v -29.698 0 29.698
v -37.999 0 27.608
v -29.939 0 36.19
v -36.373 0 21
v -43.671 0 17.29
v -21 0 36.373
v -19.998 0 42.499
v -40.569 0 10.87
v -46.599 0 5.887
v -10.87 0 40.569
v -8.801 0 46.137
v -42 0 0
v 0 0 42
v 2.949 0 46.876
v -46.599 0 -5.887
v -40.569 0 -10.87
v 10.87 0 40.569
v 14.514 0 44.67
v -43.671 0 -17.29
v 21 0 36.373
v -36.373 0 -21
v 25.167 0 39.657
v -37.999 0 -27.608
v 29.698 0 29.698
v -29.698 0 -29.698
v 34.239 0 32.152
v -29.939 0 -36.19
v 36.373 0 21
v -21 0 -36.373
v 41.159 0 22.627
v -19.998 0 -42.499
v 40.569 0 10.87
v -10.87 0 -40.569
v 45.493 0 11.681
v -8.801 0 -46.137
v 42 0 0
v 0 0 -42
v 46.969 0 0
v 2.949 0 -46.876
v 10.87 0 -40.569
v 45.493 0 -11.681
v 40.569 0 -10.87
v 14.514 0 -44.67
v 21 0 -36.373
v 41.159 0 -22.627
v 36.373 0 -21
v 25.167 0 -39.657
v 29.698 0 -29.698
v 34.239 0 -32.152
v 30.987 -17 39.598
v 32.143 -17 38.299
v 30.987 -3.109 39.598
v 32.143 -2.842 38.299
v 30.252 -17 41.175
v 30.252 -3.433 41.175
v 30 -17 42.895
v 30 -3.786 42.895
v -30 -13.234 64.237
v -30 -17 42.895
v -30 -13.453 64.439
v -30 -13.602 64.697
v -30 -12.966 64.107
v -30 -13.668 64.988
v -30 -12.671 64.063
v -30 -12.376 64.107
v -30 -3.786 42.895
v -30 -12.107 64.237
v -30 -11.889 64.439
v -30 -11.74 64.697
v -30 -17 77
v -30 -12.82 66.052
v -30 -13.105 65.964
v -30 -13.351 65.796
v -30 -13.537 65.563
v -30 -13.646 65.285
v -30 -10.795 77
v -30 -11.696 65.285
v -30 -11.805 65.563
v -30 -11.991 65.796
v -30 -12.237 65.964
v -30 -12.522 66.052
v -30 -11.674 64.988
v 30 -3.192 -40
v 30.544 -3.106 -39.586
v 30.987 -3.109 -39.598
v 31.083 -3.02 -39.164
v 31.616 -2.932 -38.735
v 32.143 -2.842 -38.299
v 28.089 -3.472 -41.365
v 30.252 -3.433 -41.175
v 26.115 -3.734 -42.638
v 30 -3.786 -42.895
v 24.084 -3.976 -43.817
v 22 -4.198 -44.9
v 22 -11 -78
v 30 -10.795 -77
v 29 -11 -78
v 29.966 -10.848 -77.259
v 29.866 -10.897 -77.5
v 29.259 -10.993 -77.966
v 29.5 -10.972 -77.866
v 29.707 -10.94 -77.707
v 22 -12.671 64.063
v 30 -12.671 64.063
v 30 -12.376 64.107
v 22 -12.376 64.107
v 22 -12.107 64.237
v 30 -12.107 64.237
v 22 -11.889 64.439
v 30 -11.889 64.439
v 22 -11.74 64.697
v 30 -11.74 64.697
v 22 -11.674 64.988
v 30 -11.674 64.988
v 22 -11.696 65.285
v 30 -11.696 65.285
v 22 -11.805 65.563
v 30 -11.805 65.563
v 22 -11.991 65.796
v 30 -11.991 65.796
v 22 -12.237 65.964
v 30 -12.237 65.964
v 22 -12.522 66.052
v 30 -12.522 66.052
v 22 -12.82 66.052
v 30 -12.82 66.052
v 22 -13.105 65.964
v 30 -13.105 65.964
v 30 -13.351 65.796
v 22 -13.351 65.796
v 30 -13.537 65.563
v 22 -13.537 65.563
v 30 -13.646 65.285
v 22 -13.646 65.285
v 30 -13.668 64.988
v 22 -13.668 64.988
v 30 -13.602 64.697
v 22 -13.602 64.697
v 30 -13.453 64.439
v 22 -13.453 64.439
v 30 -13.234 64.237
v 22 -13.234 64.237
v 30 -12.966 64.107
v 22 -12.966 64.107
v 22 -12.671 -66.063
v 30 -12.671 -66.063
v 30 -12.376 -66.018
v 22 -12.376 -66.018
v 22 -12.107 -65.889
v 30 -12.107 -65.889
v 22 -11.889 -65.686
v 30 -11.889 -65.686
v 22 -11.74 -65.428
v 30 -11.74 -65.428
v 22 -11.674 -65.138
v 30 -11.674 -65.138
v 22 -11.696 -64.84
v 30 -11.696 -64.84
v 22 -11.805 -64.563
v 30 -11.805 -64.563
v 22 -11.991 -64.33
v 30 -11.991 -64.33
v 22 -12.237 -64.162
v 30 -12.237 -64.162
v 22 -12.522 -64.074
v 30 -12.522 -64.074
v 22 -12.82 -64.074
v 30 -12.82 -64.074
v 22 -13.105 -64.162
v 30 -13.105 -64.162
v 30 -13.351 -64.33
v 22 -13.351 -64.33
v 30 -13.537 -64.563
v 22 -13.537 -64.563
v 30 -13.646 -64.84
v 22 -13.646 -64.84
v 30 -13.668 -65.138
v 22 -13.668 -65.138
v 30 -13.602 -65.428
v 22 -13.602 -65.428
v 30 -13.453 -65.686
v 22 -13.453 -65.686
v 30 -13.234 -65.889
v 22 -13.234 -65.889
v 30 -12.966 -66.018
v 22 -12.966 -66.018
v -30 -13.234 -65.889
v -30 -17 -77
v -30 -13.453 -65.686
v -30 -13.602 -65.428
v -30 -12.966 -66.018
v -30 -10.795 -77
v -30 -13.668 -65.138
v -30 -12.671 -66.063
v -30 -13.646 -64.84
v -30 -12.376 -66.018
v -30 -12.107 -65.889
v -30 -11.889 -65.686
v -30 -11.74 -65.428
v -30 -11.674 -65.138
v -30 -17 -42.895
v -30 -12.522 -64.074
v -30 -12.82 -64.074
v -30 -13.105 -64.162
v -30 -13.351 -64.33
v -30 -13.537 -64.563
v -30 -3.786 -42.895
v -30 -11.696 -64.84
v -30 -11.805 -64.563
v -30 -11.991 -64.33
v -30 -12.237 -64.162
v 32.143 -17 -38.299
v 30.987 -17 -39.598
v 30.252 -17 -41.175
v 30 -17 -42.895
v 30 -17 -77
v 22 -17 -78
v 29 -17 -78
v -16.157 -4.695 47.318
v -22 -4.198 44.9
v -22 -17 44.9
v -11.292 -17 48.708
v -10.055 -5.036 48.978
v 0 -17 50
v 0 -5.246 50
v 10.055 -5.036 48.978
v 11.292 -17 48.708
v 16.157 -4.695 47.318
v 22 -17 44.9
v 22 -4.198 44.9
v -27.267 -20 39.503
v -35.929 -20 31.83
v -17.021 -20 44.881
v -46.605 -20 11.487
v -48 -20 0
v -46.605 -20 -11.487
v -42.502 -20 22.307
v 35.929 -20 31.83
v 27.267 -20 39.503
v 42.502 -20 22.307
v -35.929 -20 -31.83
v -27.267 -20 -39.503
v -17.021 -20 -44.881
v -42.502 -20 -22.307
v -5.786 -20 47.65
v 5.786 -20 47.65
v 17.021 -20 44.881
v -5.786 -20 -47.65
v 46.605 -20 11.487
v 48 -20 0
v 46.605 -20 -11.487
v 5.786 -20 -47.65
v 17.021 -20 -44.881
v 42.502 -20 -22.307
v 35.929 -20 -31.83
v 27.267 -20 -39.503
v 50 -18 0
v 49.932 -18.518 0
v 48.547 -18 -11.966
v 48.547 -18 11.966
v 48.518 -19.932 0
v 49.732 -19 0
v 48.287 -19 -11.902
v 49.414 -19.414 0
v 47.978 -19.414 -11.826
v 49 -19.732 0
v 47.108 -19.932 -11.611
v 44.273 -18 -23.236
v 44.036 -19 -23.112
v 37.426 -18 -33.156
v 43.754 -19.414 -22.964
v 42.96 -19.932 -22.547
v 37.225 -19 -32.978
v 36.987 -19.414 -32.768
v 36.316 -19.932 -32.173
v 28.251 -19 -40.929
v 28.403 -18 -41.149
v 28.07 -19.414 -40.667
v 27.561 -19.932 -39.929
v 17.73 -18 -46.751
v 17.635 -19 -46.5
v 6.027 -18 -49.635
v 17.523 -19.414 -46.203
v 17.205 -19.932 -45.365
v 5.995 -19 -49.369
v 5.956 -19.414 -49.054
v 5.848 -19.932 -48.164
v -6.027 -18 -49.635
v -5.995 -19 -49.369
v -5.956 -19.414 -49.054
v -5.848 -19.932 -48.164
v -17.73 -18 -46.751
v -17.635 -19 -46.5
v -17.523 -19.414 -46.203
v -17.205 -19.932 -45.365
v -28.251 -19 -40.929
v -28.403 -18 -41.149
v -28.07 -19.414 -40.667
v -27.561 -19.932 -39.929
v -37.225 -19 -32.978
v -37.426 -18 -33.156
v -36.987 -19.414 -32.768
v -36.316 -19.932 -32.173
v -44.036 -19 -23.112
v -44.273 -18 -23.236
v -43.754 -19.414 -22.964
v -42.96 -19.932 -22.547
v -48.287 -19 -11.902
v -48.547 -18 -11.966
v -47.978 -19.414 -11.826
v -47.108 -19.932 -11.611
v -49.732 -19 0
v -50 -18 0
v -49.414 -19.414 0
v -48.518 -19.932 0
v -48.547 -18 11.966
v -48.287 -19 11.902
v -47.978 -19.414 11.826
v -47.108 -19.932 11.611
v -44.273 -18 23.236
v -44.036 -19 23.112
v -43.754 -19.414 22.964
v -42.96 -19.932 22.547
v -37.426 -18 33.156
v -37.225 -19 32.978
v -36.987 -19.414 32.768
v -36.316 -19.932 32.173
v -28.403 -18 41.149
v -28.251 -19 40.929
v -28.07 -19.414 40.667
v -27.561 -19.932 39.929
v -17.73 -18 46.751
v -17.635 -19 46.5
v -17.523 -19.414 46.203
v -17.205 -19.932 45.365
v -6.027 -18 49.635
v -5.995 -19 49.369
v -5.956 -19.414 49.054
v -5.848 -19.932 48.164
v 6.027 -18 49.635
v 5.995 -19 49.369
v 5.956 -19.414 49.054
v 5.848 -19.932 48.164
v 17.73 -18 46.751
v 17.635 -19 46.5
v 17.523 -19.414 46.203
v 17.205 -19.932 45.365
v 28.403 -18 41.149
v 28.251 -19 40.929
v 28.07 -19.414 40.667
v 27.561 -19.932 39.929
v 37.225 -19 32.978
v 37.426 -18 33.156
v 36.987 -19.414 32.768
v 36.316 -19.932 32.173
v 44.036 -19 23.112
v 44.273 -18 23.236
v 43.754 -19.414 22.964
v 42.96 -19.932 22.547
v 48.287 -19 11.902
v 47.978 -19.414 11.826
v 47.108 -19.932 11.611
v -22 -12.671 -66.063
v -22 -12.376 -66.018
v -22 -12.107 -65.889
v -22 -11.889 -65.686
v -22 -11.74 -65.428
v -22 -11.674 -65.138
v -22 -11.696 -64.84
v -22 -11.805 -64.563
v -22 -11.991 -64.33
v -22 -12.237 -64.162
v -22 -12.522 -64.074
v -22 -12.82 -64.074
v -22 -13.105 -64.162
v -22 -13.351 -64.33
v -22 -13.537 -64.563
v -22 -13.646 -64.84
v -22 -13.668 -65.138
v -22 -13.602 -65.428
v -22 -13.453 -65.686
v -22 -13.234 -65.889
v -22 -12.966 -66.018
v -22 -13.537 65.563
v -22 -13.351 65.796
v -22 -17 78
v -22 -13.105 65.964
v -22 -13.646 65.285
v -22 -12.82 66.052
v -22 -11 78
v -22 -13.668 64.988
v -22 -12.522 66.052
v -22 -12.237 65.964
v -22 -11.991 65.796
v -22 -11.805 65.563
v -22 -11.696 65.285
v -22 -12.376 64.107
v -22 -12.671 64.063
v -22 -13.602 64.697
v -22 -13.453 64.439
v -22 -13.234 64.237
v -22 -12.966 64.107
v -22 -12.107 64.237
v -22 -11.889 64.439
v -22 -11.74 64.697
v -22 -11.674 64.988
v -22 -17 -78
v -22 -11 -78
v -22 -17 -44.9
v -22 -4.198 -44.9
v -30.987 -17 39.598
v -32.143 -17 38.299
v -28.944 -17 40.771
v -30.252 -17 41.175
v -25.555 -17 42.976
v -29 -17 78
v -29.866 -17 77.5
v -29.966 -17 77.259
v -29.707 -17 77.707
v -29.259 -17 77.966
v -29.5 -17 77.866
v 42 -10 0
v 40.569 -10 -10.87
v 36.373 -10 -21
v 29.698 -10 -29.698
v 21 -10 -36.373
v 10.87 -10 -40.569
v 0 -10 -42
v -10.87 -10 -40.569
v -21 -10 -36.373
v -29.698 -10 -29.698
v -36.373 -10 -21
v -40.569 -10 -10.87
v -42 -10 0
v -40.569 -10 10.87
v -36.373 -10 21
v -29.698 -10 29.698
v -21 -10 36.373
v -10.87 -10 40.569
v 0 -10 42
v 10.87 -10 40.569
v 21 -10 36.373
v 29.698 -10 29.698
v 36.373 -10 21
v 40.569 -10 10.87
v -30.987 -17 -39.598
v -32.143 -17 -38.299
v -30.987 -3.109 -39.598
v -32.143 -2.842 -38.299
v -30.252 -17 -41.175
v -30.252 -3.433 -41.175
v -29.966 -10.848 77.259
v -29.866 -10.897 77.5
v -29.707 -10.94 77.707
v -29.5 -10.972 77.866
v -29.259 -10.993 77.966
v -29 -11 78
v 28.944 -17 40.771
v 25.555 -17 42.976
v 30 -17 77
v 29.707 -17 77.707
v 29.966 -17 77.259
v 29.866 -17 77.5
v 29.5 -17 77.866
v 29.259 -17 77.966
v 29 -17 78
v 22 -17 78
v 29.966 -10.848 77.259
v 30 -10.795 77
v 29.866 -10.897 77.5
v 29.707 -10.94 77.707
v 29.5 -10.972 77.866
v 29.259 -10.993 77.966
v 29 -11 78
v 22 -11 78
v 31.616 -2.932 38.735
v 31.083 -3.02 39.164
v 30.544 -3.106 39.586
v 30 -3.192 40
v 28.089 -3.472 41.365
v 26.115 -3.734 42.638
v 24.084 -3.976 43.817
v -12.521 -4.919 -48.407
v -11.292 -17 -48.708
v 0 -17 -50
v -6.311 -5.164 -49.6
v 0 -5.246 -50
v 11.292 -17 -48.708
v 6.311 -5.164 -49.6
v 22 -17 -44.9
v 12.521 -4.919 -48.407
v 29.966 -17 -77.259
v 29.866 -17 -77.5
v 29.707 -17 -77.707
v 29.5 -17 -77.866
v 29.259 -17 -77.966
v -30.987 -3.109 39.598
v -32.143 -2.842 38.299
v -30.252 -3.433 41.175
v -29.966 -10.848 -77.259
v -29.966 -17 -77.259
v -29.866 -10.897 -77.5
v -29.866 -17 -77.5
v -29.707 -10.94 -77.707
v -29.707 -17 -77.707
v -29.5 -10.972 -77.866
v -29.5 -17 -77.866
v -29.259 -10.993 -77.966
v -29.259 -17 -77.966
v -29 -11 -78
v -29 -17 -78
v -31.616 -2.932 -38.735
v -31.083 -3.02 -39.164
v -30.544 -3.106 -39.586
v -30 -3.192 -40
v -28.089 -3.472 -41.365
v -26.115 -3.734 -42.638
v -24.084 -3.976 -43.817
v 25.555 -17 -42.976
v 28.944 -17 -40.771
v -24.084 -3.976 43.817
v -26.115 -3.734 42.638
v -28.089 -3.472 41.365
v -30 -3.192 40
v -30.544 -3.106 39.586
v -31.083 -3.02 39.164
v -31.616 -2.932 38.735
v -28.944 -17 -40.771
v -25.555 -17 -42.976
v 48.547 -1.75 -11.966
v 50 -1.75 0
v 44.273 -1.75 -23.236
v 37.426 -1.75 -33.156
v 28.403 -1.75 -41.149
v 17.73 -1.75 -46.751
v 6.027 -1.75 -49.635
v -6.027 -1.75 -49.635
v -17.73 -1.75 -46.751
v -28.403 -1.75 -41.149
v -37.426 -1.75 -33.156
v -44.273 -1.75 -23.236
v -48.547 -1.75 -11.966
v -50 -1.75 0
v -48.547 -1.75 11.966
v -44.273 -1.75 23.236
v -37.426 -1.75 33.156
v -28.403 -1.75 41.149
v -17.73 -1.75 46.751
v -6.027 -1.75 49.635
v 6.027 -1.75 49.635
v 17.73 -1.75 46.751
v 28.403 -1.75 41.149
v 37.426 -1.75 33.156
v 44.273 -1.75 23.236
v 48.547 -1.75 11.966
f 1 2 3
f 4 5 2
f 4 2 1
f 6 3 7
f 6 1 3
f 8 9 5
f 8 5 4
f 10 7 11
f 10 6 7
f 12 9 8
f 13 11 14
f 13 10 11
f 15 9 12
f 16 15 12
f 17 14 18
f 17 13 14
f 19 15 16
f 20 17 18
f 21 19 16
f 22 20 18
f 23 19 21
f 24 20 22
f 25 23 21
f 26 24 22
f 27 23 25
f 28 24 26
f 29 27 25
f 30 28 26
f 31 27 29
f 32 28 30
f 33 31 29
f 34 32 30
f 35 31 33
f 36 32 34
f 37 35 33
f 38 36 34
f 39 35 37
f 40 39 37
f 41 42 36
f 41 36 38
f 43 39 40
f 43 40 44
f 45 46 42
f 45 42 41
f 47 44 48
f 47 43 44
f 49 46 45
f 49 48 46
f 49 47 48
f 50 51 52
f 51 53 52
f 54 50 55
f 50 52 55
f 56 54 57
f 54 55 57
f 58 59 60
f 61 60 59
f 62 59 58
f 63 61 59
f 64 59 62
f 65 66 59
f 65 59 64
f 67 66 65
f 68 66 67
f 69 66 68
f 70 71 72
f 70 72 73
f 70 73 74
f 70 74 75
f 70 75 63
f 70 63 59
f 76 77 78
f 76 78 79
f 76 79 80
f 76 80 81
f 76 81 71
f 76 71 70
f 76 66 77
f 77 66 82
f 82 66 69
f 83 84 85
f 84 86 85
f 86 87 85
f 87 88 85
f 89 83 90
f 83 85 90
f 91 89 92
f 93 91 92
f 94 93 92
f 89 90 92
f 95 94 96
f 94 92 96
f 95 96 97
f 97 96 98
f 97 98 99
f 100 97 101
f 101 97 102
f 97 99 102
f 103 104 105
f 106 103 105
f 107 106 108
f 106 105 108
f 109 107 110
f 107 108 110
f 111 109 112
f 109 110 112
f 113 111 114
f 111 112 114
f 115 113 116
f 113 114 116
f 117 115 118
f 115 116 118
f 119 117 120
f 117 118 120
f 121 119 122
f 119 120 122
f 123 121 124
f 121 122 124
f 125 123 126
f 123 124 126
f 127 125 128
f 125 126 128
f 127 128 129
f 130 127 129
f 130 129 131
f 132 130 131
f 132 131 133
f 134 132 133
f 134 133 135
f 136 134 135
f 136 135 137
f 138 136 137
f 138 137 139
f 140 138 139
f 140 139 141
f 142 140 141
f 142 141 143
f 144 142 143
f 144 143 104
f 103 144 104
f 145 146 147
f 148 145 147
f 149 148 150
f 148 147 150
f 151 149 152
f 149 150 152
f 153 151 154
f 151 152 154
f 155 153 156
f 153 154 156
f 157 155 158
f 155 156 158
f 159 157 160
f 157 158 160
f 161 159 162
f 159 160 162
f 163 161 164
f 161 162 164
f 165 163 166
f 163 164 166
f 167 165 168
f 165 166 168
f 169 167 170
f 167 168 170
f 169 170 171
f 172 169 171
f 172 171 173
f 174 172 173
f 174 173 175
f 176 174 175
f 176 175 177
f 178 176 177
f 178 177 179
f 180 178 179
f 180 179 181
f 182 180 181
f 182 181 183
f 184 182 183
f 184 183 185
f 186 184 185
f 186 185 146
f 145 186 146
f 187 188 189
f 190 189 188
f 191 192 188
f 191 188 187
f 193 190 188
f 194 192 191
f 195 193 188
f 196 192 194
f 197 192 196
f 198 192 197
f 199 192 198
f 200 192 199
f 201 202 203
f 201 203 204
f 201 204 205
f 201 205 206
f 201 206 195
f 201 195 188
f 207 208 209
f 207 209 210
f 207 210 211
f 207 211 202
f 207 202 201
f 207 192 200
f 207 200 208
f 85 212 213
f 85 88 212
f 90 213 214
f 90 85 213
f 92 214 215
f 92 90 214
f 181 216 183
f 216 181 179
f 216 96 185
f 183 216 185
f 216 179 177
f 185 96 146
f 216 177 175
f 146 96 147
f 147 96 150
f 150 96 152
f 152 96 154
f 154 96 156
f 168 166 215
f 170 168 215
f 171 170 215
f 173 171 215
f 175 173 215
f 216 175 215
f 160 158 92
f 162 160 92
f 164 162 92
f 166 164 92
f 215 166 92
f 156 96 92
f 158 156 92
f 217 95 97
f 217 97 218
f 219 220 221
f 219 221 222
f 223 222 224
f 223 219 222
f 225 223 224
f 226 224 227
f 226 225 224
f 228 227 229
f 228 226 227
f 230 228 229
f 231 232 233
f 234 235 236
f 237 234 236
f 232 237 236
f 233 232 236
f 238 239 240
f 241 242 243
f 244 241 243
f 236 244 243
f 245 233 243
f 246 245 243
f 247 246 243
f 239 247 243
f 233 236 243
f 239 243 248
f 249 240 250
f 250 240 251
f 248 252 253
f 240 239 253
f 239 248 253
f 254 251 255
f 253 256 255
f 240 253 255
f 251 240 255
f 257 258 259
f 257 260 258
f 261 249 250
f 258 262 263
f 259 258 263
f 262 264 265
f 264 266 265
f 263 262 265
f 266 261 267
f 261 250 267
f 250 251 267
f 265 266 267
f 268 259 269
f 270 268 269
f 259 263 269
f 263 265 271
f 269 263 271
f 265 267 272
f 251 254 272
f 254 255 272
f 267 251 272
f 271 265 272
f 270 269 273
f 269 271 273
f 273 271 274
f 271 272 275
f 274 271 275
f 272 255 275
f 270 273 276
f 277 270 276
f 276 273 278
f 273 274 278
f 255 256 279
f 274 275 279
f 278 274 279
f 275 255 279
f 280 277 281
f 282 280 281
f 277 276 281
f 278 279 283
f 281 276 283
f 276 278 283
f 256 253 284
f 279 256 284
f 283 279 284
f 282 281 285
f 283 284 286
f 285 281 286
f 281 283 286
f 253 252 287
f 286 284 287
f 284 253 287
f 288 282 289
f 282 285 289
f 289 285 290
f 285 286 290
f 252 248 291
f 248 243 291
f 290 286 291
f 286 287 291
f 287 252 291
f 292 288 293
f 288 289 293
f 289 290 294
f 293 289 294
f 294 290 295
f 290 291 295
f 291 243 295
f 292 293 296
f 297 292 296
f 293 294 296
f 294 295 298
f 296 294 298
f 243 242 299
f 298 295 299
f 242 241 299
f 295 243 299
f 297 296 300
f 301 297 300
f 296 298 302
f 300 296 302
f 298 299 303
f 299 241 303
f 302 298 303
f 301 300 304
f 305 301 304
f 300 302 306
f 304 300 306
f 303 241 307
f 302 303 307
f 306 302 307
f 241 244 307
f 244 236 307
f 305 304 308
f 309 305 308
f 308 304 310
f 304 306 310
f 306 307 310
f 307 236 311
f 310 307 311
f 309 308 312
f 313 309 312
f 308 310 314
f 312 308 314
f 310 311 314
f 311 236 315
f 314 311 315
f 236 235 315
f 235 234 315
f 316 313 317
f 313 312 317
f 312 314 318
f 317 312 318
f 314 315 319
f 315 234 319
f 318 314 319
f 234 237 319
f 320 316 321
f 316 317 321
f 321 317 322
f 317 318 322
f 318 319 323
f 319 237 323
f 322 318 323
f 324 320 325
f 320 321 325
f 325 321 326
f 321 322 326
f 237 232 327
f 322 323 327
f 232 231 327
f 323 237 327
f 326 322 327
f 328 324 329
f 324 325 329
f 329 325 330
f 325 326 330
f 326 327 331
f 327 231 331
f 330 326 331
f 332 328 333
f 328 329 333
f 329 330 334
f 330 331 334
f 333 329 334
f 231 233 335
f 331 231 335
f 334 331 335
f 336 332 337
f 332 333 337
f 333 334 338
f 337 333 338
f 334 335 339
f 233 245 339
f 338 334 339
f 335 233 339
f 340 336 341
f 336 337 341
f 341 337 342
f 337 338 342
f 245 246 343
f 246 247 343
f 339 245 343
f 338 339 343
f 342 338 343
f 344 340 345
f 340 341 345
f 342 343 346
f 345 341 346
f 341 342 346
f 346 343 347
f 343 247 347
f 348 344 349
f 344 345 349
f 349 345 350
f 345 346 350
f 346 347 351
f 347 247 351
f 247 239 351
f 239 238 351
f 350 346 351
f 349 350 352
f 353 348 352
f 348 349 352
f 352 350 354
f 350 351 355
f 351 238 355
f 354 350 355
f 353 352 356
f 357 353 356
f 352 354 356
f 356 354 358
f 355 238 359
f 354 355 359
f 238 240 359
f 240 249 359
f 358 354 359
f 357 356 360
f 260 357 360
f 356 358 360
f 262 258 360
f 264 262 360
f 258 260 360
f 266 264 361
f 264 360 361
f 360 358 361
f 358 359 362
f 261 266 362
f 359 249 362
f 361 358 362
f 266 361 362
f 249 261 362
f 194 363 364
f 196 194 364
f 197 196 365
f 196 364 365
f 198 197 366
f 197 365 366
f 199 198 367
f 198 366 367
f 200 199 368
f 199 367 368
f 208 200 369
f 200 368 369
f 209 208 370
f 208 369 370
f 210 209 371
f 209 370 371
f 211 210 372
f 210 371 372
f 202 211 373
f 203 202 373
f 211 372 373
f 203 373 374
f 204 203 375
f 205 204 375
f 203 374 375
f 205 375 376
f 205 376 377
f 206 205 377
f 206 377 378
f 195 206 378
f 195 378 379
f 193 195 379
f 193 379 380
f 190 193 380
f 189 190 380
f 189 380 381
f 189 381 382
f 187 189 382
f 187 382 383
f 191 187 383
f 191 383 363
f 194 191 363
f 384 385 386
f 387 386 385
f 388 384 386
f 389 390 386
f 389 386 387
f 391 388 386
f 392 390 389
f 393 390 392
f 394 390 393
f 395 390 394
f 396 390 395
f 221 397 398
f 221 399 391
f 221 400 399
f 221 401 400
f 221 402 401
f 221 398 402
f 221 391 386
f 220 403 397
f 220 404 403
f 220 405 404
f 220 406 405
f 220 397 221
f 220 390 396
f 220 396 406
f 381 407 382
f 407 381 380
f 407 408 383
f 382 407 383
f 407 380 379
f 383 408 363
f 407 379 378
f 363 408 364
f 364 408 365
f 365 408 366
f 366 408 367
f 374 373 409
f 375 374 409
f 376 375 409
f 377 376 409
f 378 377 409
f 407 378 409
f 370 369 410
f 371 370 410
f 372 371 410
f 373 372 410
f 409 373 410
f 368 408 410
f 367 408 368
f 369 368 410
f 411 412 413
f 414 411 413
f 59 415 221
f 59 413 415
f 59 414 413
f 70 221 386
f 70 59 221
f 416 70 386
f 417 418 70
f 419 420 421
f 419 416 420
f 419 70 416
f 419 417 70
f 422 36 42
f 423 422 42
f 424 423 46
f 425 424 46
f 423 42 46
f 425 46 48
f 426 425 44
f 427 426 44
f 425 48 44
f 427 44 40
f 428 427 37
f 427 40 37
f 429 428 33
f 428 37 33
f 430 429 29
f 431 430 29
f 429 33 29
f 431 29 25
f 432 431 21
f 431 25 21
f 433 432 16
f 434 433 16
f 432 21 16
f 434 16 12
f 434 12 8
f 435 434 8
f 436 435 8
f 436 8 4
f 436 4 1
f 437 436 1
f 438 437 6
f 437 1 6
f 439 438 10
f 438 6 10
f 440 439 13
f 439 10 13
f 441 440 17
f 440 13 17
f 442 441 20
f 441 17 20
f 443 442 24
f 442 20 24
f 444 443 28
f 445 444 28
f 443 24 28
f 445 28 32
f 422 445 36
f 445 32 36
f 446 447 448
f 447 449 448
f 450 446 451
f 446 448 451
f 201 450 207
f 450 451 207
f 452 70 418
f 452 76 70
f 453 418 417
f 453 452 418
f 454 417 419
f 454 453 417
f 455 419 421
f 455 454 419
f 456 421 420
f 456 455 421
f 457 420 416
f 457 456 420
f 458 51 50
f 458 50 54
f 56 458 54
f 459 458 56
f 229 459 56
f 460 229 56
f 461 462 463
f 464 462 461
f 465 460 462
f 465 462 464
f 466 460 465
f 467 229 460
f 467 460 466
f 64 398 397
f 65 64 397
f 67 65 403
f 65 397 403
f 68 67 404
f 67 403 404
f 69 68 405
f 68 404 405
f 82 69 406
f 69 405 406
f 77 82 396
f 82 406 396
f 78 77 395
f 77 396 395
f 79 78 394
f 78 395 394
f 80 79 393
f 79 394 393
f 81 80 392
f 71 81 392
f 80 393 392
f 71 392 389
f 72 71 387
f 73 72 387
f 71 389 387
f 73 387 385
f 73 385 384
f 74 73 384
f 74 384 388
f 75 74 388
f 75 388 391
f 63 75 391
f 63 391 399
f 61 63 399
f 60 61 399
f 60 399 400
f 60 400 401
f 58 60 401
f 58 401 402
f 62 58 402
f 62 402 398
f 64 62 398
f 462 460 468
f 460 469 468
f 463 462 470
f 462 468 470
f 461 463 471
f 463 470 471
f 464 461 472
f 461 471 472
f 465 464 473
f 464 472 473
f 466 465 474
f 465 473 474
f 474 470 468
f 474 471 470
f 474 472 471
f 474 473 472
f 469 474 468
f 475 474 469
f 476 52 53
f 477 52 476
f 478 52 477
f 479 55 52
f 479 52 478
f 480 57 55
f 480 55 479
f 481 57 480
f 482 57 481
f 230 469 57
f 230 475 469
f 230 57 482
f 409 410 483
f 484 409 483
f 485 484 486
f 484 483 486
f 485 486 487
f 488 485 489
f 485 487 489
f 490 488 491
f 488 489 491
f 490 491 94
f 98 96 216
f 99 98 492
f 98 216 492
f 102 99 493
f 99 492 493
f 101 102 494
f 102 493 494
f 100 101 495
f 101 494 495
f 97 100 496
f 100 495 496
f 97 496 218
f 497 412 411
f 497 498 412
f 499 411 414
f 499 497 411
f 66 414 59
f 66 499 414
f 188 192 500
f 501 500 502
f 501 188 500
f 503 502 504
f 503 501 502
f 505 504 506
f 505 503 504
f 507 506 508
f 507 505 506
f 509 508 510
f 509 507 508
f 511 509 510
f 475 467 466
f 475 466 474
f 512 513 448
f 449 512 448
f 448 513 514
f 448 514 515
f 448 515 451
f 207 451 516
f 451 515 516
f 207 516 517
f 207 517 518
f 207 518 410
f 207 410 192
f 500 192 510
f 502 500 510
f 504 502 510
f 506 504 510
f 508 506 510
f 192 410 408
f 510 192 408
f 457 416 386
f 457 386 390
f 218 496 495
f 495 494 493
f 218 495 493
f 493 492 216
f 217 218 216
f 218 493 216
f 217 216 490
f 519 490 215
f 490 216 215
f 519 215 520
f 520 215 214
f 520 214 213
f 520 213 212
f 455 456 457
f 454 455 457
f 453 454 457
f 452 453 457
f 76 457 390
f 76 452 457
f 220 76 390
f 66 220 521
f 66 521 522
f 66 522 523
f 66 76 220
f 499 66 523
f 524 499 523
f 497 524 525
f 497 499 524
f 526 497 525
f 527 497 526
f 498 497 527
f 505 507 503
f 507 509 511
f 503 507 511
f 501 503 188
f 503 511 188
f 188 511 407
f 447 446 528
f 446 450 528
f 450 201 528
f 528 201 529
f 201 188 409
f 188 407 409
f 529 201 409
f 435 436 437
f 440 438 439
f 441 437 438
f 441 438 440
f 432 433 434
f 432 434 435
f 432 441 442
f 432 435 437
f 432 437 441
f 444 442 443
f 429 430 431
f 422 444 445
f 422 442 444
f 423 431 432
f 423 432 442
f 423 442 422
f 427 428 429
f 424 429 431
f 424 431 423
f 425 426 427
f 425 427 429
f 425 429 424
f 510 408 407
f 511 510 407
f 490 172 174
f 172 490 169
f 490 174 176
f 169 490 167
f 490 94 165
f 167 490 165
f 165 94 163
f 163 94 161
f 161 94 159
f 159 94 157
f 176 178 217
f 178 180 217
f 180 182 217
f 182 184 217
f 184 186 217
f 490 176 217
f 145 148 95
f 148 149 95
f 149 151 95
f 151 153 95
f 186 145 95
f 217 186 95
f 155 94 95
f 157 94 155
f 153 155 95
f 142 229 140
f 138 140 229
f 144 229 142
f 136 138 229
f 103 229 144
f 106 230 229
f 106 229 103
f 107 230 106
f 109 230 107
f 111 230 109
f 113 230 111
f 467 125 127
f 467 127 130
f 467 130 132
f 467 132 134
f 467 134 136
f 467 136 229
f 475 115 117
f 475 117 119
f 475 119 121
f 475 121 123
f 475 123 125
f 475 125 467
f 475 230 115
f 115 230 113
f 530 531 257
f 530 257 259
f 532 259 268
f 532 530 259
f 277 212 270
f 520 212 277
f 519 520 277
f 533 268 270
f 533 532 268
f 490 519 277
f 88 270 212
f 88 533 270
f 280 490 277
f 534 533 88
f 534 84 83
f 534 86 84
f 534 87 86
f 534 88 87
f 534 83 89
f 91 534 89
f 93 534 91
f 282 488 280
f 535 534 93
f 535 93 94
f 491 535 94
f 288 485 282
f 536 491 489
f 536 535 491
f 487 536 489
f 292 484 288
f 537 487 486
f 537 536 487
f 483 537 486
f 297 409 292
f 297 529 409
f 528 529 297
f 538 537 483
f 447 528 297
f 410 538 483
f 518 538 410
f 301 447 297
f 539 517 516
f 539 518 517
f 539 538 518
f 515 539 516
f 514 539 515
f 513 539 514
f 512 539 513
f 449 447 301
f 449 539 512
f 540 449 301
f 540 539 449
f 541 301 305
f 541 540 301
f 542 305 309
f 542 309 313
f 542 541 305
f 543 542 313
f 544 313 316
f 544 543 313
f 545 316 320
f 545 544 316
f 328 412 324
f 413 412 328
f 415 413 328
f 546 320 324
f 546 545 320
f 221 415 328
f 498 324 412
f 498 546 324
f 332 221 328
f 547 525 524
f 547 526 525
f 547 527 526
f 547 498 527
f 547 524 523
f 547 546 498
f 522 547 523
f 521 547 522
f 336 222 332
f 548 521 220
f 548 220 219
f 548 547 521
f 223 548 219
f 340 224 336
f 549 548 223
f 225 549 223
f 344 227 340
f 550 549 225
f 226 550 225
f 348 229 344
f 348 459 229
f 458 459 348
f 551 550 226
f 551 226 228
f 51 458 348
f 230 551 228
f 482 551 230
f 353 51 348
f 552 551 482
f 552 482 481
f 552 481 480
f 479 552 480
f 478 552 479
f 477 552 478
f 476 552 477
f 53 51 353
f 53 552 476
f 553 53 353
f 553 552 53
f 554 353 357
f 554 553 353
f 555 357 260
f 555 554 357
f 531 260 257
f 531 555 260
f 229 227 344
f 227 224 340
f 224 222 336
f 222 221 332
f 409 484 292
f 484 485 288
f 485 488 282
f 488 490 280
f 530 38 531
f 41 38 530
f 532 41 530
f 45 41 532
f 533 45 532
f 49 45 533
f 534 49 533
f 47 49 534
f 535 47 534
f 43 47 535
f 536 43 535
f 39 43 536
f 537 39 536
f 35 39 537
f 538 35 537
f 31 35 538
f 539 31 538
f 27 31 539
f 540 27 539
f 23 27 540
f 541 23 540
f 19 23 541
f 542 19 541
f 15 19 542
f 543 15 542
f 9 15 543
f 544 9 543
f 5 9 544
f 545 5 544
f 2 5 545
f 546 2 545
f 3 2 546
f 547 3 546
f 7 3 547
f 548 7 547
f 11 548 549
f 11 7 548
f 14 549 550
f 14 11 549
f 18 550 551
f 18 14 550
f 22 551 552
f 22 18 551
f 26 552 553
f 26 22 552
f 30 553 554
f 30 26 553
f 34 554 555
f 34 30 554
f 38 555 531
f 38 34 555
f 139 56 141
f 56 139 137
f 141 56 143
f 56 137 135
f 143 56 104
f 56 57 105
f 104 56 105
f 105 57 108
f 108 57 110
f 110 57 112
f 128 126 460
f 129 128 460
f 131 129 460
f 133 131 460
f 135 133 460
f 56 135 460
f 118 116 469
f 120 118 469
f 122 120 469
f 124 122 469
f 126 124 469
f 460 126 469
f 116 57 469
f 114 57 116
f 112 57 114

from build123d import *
from build123d.topology import SkipClean

# Parameters (mm, degrees)
SKETCH1_R                = 50
BOSS_EXTRUDE1_DEPTH      = 20
BOSS_EXTRUDE2_DEPTH      = 30
BOSS_EXTRUDE2_DEPTH_BACK = 30
CUT_EXTRUDE2_DEPTH       = 30
CHAMFER1_SIZE            = 1.75
CHAMFER1_SIZE2           = 3.031089
SKETCH5_R                = 42
CUT_EXTRUDE3_DEPTH       = 10
FILLET1_R                = 6
FILLET2_R                = 6
FILLET3_R                = 2
FILLET4_R                = 1
CUT_EXTRUDE5_DEPTH       = 20
CUT_EXTRUDE5_DEPTH_BACK  = 85
SKETCH7_R                = 1
CUT_EXTRUDE6_DEPTH       = 25
CUT_EXTRUDE6_DEPTH_BACK  = 93
SKETCH8_R                = 1


with BuildPart() as part:
    # Sketch1 → Boss-Extrude1 (new body)
    with BuildSketch(Plane(origin=(0, 0, 0), x_dir=(1, 0, 0), z_dir=(0, 1, 0))):
        Circle(SKETCH1_R)
    extrude(amount=-BOSS_EXTRUDE1_DEPTH)

    # Sketch3 → Boss-Extrude2 (add, two sides: drawn at the far end of the back side and taken through both)
    with BuildSketch(Plane(origin=(0, 0, 0), x_dir=(0, 0, -1), z_dir=(1, 0, 0)).offset(-BOSS_EXTRUDE2_DEPTH_BACK)):
        Polygon((34.980741, -17), (34.980741, -2.160126), (78, -11), (78, -17), align=None)
        Polygon((-78, -11), (-34.980741, -2.160126), (-34.980741, -17), (-78, -17), align=None)
    extrude(amount=BOSS_EXTRUDE2_DEPTH + BOSS_EXTRUDE2_DEPTH_BACK)

    # Sketch4 → Cut-Extrude2 (cut)
    with SkipClean():  # the faces are left unmerged after this step: merging them gives an invalid solid
        with BuildSketch(Plane(origin=(0, 0, 0), x_dir=(1, 0, 0), z_dir=(0, 1, 0))):
            with BuildLine():
                Line((22, 78), (-22, 78))
                Line((-22, 78), (-22, 44.899889))
                ThreePointArc((-22, 44.899889), (0, 50), (22, 44.899889))
                Line((22, 44.899889), (22, 78))
            make_face()
            with BuildLine():
                Line((-22, -78), (-22, -44.899889))
                ThreePointArc((-22, -44.899889), (0, -50), (22, -44.899889))
                Line((22, -44.899889), (22, -78))
                Line((22, -78), (-22, -78))
            make_face()
        extrude(amount=-CUT_EXTRUDE2_DEPTH, mode=Mode.SUBTRACT)

    # Chamfer1
    chamfer1_edges = [part.edges().sort_by_distance(p)[0] for p in [
        (0, 0, 50),
    ]]
    chamfer1_side = [part.faces().sort_by_distance(p)[0] for p in [
        (0, -2.700156, 50),
    ]]
    chamfer(chamfer1_edges, length=CHAMFER1_SIZE, length2=CHAMFER1_SIZE2, reference=chamfer1_side[0])

    # Sketch5 → Cut-Extrude3 (cut)
    with SkipClean():  # the faces are left unmerged after this step: merging them gives an invalid solid
        with BuildSketch(Plane(origin=(0, 0, 0), x_dir=(1, 0, 0), z_dir=(0, 1, 0))):
            Circle(SKETCH5_R)
        extrude(amount=-CUT_EXTRUDE3_DEPTH, mode=Mode.SUBTRACT)

    # Fillet1
    fillet1_edges = [part.edges().sort_by_distance(p)[0] for p in [
        (30, -10.095758, 40),
    ]]
    fillet(fillet1_edges, radius=FILLET1_R)

    # Fillet2
    fillet2_edges = [part.edges().sort_by_distance(p)[0] for p in [
        (30, -10.095758, -40),
        (-30, -10.095758, -40),
        (-30, -10.095758, 40),
    ]]
    fillet(fillet2_edges, radius=FILLET2_R)

    # Fillet3
    fillet3_edges = [part.edges().sort_by_distance(p)[0] for p in [
        (0, -20, 50),
    ]]
    fillet(fillet3_edges, radius=FILLET3_R)

    # Fillet4
    fillet4_edges = [part.edges().sort_by_distance(p)[0] for p in [
        (30, -14, 78),
        (-30, -14, 78),
        (30, -14, -78),
        (-30, -14, -78),
    ]]
    fillet(fillet4_edges, radius=FILLET4_R)

    # Sketch7 → Cut-Extrude5 (cut, two sides: drawn at the far end of the back side and taken through both)
    with SkipClean():  # the faces are left unmerged after this step: merging them gives an invalid solid
        with BuildSketch(Plane(origin=(30, 0, 0), x_dir=(0, 0, -1), z_dir=(1, 0, 0)).offset(-CUT_EXTRUDE5_DEPTH_BACK)):
            with Locations((-65.06284, -12.670795)):
                Circle(SKETCH7_R)
        extrude(amount=CUT_EXTRUDE5_DEPTH + CUT_EXTRUDE5_DEPTH_BACK, mode=Mode.SUBTRACT)

    # Sketch8 → Cut-Extrude6 (cut, two sides: drawn at the far end of the back side and taken through both)
    with SkipClean():  # the faces are left unmerged after this step: merging them gives an invalid solid
        with BuildSketch(Plane(origin=(30, 0, 0), x_dir=(0, 0, -1), z_dir=(1, 0, 0)).offset(-CUT_EXTRUDE6_DEPTH_BACK)):
            with Locations((65.06284, -12.670795)):
                Circle(SKETCH8_R)
        extrude(amount=CUT_EXTRUDE6_DEPTH + CUT_EXTRUDE6_DEPTH_BACK, mode=Mode.SUBTRACT)


solid = part.part
